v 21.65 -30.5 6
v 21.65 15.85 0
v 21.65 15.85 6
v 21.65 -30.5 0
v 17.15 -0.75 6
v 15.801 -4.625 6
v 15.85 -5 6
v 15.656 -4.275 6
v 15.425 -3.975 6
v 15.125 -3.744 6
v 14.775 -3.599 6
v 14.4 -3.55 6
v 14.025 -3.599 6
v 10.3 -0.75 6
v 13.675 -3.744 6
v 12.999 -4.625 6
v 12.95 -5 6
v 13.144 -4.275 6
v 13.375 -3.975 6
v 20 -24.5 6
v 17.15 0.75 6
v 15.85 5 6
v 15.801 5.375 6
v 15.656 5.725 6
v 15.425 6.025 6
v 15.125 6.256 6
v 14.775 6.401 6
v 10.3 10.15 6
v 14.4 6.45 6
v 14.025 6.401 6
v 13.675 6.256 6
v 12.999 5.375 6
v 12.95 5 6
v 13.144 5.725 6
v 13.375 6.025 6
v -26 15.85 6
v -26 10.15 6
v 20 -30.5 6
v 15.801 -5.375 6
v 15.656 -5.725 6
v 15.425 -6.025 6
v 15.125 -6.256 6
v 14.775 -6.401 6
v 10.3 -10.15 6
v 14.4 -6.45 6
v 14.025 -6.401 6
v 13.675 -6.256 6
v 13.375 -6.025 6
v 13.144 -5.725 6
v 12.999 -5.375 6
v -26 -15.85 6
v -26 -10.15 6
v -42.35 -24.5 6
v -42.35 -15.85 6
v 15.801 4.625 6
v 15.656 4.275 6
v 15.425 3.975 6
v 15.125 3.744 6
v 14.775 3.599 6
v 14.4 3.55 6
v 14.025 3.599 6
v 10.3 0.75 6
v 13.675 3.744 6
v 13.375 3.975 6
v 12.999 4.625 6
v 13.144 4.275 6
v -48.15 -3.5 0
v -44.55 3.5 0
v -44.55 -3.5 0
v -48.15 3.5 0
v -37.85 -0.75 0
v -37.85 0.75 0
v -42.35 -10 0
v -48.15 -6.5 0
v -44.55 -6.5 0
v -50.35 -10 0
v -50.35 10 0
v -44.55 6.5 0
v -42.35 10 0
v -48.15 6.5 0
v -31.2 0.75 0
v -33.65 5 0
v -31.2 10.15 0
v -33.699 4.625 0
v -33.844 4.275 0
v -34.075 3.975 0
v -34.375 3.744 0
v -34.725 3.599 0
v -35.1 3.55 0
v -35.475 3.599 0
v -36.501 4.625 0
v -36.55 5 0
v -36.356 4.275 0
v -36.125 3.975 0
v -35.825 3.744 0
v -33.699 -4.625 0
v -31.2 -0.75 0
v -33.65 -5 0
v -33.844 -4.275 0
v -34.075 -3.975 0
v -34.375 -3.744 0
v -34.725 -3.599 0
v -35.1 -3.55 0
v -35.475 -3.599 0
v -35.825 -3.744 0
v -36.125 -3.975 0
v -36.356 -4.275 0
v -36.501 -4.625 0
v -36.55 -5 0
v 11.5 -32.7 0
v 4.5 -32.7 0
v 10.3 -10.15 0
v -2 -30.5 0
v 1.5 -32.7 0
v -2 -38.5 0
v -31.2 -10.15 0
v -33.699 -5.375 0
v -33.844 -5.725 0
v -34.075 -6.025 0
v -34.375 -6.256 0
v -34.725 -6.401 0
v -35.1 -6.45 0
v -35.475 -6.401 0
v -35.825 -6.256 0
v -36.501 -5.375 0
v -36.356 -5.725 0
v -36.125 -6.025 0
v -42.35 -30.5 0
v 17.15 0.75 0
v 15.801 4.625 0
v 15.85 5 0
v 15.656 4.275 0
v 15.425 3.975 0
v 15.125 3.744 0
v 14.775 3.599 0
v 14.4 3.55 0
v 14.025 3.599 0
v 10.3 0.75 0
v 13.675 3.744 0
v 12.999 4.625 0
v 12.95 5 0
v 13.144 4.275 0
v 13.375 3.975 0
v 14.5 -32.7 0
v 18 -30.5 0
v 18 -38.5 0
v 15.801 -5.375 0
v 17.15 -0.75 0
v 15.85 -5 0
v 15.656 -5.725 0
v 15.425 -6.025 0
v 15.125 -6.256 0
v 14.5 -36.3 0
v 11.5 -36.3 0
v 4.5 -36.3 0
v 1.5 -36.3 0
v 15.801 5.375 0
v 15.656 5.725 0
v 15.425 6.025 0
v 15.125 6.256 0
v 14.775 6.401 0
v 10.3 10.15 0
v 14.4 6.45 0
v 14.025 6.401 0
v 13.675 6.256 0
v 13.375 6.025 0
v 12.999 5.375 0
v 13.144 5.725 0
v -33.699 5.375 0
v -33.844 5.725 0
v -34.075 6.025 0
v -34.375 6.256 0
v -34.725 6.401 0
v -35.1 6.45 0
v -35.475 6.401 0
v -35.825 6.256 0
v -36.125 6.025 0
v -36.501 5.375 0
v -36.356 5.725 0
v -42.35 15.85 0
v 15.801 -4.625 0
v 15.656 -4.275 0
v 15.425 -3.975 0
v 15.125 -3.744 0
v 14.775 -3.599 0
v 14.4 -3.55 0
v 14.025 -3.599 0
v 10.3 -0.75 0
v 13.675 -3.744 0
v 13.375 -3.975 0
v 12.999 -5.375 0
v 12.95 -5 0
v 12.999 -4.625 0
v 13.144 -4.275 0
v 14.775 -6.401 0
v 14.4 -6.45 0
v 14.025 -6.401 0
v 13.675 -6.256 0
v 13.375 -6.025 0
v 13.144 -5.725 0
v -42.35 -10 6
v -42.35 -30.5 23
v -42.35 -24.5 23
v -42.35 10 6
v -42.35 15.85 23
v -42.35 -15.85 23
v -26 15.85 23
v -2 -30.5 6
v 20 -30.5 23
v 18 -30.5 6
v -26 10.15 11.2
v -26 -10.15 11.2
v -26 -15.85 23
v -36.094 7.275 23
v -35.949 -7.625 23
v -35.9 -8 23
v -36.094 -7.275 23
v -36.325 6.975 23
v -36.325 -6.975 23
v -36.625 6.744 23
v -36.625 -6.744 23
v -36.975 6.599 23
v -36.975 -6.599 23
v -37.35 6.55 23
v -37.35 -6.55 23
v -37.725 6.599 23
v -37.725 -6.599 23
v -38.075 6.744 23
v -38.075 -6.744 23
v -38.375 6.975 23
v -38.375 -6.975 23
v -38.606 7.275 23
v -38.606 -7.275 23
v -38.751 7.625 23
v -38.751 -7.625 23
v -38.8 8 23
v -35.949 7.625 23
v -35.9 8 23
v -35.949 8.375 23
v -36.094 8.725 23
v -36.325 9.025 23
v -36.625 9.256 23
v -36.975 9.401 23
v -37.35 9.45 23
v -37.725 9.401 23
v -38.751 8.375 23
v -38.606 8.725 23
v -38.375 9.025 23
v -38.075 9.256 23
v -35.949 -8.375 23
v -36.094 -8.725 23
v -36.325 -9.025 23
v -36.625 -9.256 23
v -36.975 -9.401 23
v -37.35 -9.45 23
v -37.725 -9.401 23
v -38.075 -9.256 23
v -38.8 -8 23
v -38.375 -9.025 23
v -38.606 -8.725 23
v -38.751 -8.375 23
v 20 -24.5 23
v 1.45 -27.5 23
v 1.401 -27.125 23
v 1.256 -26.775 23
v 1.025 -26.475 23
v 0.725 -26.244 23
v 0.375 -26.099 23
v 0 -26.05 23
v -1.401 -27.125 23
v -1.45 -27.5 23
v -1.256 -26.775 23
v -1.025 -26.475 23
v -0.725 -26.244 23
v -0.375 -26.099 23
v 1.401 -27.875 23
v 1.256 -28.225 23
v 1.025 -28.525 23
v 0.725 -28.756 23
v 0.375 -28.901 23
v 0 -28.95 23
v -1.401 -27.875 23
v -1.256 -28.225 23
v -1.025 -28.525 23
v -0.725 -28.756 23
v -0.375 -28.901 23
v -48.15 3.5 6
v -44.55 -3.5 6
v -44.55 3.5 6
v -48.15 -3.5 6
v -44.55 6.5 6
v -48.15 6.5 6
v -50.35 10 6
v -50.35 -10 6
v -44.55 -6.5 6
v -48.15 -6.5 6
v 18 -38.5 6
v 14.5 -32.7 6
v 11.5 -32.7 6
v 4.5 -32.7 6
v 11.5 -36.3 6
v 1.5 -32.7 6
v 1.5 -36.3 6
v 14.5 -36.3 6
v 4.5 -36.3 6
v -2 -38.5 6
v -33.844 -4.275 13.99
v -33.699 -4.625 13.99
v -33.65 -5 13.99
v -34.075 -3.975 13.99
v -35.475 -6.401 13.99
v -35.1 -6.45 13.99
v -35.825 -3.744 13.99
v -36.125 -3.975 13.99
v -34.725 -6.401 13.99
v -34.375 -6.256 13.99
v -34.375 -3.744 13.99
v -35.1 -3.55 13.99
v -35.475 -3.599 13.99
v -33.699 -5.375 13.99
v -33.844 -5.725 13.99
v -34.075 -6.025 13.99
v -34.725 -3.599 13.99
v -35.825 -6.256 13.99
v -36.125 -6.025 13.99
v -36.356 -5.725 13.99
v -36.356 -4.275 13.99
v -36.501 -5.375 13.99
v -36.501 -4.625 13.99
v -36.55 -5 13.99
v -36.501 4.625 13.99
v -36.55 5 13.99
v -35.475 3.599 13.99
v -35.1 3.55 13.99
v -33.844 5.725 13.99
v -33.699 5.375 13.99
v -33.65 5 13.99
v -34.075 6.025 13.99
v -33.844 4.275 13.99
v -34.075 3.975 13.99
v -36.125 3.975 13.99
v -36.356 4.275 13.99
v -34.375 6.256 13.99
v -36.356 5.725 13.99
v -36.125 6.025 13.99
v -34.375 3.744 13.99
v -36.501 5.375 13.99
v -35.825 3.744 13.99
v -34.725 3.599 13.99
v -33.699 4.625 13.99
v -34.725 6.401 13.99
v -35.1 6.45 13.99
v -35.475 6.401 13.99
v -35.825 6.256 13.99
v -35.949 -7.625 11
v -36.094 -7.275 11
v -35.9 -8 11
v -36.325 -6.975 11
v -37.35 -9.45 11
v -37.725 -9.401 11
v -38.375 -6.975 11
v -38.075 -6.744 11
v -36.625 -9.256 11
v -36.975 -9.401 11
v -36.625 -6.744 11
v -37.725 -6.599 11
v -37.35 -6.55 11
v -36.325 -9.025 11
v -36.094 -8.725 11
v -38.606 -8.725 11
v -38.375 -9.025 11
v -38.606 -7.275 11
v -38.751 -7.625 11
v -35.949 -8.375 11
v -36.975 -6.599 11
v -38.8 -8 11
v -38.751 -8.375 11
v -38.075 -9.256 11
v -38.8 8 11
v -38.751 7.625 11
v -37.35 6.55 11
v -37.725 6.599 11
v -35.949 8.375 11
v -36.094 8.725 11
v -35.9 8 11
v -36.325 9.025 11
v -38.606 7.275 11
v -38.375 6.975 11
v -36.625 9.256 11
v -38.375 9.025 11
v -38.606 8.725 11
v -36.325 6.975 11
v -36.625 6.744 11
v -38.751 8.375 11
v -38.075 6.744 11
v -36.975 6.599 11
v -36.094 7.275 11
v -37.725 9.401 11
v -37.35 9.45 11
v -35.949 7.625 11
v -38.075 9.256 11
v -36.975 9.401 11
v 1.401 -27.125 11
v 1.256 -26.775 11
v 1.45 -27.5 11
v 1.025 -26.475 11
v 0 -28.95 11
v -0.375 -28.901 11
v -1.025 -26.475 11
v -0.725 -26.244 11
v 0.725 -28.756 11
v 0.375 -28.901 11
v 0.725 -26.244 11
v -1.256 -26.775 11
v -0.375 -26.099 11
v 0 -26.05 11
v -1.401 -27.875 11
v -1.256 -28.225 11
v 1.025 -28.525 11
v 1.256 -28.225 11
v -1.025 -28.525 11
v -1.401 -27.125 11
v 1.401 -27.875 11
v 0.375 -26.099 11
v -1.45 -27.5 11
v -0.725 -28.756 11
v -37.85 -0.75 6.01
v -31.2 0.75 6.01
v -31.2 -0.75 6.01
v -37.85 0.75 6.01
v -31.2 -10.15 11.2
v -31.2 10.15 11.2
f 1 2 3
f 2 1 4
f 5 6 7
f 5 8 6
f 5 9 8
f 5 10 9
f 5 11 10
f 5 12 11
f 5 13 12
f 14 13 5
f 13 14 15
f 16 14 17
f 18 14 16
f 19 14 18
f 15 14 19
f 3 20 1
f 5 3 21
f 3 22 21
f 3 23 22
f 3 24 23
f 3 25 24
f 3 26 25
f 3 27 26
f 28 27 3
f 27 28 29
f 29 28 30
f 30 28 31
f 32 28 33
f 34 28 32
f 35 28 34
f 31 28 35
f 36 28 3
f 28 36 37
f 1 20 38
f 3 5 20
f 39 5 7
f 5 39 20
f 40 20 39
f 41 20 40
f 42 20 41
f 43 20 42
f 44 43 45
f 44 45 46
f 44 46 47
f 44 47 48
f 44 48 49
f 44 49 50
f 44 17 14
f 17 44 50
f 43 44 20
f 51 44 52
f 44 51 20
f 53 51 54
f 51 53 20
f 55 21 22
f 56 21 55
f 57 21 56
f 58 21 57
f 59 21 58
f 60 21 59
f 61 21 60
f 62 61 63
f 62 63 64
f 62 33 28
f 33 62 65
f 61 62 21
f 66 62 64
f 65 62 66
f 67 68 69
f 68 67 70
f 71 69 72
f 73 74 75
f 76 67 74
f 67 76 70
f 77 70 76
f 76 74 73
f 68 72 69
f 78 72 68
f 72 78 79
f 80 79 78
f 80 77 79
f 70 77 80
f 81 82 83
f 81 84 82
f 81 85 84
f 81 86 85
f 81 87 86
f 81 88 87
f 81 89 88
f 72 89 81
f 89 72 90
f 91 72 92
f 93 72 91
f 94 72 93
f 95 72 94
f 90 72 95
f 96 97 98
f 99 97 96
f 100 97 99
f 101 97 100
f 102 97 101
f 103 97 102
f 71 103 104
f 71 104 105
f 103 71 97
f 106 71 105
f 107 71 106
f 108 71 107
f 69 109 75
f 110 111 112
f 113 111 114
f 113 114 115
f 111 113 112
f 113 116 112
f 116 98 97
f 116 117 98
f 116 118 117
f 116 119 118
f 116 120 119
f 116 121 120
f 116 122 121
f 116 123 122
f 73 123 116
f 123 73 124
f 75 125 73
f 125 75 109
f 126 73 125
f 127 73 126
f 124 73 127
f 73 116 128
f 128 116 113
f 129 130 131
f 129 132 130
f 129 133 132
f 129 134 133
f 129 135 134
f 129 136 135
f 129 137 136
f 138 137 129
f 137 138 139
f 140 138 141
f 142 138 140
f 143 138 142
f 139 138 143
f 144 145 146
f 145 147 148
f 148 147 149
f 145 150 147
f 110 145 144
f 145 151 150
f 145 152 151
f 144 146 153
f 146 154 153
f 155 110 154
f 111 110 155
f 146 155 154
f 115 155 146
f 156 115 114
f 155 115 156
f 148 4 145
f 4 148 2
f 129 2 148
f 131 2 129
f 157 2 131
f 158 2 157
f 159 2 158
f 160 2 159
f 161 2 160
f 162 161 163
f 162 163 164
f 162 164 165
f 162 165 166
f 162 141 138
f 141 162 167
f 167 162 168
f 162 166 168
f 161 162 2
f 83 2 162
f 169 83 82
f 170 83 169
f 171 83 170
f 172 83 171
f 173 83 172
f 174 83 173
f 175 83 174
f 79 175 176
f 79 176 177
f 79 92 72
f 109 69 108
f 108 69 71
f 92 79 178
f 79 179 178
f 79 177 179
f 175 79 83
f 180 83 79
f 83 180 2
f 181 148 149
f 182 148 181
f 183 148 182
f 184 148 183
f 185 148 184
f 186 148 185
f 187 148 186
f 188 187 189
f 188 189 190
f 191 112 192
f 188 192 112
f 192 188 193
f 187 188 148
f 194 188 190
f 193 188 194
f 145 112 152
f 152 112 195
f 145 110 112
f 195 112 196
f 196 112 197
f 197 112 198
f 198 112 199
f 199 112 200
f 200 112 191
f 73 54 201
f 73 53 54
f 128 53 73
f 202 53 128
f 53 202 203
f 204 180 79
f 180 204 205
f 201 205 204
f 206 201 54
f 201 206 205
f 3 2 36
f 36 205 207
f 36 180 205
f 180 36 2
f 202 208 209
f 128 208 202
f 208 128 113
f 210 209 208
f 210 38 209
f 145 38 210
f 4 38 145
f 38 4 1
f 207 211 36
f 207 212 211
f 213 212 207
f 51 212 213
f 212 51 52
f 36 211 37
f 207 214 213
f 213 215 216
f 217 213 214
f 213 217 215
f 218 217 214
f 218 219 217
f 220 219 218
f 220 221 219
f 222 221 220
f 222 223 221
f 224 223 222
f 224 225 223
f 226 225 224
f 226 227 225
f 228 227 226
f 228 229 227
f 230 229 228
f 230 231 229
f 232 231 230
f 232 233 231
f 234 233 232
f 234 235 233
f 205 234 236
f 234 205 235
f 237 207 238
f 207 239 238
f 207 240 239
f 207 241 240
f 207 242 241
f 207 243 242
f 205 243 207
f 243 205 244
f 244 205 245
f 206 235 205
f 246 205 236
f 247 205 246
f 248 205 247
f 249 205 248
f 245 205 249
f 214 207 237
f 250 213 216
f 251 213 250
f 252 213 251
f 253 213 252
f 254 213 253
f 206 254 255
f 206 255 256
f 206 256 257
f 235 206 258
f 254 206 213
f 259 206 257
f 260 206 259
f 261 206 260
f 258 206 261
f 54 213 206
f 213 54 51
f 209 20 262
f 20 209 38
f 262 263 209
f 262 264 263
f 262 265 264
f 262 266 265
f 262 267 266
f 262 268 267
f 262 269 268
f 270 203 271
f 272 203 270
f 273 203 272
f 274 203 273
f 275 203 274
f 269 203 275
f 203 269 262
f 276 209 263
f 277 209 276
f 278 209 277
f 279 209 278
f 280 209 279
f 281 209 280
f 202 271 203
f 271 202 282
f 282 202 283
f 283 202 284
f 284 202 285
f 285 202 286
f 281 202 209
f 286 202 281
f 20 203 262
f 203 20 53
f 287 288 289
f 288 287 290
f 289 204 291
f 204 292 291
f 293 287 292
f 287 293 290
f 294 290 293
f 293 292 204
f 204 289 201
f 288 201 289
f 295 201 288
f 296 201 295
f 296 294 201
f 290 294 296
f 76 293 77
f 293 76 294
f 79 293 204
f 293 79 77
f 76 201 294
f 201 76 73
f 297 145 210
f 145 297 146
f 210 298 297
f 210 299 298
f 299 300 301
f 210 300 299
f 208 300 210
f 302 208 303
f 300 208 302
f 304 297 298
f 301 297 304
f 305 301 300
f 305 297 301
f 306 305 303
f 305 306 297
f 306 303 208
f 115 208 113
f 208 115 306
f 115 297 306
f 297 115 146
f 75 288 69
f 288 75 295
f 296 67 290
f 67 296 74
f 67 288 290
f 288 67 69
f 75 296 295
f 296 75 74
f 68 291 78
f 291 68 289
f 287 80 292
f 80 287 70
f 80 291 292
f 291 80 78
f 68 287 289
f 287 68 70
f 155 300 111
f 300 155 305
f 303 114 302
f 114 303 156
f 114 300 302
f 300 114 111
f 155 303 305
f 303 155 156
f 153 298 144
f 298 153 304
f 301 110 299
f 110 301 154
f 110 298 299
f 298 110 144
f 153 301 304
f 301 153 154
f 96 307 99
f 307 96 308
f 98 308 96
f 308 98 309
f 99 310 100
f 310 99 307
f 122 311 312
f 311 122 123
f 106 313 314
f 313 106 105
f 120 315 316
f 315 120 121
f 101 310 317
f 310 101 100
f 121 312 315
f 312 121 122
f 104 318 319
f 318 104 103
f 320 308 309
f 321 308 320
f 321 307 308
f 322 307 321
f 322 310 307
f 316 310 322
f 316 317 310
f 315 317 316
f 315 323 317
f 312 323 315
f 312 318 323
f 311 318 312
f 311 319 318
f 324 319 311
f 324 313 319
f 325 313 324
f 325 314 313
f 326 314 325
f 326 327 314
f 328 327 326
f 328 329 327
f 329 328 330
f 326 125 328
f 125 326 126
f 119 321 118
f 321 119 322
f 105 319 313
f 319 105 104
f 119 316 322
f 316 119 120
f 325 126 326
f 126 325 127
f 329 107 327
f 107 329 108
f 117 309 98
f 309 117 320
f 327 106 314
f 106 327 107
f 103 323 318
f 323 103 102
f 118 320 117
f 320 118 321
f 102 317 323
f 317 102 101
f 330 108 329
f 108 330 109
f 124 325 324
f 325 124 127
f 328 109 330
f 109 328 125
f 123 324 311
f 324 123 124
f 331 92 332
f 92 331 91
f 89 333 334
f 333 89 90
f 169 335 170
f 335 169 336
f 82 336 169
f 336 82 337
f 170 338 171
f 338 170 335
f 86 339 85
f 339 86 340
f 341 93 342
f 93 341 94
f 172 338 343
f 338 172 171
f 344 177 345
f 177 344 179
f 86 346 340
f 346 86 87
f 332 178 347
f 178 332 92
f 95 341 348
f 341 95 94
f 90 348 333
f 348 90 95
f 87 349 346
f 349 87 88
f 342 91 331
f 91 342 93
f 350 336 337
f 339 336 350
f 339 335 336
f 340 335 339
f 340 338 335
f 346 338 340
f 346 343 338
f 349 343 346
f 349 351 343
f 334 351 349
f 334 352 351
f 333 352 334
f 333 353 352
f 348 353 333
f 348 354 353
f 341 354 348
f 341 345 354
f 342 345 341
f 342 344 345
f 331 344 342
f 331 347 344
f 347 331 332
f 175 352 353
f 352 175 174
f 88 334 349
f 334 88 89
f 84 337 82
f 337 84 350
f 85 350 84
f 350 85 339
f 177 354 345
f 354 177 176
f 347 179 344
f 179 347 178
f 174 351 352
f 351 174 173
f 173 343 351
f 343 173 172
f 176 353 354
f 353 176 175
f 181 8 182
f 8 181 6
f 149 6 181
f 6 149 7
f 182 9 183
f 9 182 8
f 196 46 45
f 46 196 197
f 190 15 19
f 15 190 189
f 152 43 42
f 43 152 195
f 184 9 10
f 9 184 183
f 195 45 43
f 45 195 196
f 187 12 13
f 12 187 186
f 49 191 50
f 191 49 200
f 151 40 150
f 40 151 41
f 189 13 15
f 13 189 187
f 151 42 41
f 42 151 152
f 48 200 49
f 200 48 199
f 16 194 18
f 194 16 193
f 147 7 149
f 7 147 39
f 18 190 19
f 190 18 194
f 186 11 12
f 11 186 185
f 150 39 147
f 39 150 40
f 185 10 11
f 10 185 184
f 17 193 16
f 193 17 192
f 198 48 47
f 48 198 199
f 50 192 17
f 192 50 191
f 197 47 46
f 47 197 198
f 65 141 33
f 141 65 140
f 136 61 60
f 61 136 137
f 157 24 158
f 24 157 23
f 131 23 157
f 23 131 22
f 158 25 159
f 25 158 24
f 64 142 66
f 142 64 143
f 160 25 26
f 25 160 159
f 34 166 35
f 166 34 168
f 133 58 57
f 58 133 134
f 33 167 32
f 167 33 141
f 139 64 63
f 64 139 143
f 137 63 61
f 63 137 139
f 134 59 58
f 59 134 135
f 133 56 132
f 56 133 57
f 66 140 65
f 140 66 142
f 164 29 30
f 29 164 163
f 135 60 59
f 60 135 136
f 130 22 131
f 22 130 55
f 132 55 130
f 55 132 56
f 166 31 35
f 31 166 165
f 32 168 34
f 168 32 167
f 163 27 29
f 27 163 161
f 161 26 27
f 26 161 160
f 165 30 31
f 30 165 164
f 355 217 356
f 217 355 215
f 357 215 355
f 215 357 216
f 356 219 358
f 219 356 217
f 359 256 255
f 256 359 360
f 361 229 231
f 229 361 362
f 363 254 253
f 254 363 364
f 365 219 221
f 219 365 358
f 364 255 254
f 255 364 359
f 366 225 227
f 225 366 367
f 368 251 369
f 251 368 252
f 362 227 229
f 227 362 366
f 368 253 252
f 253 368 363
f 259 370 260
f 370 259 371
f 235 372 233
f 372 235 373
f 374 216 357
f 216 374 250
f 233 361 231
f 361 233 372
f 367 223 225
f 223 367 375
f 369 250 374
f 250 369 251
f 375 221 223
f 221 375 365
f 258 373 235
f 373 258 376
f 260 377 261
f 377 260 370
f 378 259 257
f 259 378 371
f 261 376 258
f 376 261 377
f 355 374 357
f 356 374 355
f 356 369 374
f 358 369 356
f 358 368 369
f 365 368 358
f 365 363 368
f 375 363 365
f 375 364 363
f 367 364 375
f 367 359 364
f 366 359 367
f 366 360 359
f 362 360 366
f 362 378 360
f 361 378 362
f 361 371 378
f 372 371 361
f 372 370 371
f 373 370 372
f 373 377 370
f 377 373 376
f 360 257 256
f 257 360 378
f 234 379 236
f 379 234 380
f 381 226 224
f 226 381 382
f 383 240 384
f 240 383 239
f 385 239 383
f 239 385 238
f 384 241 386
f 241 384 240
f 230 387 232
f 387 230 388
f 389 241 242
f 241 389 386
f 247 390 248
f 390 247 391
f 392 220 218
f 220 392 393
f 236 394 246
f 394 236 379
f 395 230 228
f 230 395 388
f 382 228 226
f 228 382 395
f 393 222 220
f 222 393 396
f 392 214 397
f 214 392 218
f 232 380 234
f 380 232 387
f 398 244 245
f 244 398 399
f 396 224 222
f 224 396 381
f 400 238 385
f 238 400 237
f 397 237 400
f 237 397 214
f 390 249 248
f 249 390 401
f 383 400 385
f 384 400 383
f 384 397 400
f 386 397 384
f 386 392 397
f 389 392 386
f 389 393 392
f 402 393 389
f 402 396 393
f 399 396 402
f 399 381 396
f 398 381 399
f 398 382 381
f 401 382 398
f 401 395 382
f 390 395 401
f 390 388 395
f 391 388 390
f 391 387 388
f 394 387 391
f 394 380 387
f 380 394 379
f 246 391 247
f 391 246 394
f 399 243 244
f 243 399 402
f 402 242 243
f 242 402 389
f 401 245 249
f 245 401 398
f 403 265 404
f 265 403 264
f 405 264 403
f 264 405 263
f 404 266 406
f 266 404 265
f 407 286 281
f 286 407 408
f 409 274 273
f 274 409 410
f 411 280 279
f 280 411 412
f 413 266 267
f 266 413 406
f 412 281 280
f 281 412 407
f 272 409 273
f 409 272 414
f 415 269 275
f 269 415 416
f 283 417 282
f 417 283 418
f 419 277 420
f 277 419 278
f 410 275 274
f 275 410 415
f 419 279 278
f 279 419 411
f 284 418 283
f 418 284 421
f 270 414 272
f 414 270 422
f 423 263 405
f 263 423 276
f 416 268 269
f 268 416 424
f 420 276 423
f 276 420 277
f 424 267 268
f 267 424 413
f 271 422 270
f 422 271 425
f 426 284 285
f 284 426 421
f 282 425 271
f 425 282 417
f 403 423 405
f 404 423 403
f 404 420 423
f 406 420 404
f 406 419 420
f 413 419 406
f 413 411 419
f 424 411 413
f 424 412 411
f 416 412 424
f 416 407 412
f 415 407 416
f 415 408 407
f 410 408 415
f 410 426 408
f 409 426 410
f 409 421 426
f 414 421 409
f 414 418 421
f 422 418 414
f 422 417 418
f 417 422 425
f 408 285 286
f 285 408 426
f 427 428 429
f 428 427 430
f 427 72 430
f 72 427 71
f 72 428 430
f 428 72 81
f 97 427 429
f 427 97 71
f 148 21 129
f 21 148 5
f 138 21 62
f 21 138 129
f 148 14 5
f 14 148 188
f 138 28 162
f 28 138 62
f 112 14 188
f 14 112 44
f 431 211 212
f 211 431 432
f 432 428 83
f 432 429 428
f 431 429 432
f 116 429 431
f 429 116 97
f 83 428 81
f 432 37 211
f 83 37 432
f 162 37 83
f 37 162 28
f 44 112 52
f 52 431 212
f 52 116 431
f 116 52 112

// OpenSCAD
// Inverted MG995 holder. Qty 2 (X servo on the X base, Y servo on the
// X carriage). Print with the ear plate on the bed, walls up.
// Servo ears: 4x M3x12 self-tapping. Holder to floor: 3x M3x12
// self-tapping from underneath the base / carriage.
include <../lib.scad>
translate([0, 0, -servo_ear_top]) mg995_holder();
